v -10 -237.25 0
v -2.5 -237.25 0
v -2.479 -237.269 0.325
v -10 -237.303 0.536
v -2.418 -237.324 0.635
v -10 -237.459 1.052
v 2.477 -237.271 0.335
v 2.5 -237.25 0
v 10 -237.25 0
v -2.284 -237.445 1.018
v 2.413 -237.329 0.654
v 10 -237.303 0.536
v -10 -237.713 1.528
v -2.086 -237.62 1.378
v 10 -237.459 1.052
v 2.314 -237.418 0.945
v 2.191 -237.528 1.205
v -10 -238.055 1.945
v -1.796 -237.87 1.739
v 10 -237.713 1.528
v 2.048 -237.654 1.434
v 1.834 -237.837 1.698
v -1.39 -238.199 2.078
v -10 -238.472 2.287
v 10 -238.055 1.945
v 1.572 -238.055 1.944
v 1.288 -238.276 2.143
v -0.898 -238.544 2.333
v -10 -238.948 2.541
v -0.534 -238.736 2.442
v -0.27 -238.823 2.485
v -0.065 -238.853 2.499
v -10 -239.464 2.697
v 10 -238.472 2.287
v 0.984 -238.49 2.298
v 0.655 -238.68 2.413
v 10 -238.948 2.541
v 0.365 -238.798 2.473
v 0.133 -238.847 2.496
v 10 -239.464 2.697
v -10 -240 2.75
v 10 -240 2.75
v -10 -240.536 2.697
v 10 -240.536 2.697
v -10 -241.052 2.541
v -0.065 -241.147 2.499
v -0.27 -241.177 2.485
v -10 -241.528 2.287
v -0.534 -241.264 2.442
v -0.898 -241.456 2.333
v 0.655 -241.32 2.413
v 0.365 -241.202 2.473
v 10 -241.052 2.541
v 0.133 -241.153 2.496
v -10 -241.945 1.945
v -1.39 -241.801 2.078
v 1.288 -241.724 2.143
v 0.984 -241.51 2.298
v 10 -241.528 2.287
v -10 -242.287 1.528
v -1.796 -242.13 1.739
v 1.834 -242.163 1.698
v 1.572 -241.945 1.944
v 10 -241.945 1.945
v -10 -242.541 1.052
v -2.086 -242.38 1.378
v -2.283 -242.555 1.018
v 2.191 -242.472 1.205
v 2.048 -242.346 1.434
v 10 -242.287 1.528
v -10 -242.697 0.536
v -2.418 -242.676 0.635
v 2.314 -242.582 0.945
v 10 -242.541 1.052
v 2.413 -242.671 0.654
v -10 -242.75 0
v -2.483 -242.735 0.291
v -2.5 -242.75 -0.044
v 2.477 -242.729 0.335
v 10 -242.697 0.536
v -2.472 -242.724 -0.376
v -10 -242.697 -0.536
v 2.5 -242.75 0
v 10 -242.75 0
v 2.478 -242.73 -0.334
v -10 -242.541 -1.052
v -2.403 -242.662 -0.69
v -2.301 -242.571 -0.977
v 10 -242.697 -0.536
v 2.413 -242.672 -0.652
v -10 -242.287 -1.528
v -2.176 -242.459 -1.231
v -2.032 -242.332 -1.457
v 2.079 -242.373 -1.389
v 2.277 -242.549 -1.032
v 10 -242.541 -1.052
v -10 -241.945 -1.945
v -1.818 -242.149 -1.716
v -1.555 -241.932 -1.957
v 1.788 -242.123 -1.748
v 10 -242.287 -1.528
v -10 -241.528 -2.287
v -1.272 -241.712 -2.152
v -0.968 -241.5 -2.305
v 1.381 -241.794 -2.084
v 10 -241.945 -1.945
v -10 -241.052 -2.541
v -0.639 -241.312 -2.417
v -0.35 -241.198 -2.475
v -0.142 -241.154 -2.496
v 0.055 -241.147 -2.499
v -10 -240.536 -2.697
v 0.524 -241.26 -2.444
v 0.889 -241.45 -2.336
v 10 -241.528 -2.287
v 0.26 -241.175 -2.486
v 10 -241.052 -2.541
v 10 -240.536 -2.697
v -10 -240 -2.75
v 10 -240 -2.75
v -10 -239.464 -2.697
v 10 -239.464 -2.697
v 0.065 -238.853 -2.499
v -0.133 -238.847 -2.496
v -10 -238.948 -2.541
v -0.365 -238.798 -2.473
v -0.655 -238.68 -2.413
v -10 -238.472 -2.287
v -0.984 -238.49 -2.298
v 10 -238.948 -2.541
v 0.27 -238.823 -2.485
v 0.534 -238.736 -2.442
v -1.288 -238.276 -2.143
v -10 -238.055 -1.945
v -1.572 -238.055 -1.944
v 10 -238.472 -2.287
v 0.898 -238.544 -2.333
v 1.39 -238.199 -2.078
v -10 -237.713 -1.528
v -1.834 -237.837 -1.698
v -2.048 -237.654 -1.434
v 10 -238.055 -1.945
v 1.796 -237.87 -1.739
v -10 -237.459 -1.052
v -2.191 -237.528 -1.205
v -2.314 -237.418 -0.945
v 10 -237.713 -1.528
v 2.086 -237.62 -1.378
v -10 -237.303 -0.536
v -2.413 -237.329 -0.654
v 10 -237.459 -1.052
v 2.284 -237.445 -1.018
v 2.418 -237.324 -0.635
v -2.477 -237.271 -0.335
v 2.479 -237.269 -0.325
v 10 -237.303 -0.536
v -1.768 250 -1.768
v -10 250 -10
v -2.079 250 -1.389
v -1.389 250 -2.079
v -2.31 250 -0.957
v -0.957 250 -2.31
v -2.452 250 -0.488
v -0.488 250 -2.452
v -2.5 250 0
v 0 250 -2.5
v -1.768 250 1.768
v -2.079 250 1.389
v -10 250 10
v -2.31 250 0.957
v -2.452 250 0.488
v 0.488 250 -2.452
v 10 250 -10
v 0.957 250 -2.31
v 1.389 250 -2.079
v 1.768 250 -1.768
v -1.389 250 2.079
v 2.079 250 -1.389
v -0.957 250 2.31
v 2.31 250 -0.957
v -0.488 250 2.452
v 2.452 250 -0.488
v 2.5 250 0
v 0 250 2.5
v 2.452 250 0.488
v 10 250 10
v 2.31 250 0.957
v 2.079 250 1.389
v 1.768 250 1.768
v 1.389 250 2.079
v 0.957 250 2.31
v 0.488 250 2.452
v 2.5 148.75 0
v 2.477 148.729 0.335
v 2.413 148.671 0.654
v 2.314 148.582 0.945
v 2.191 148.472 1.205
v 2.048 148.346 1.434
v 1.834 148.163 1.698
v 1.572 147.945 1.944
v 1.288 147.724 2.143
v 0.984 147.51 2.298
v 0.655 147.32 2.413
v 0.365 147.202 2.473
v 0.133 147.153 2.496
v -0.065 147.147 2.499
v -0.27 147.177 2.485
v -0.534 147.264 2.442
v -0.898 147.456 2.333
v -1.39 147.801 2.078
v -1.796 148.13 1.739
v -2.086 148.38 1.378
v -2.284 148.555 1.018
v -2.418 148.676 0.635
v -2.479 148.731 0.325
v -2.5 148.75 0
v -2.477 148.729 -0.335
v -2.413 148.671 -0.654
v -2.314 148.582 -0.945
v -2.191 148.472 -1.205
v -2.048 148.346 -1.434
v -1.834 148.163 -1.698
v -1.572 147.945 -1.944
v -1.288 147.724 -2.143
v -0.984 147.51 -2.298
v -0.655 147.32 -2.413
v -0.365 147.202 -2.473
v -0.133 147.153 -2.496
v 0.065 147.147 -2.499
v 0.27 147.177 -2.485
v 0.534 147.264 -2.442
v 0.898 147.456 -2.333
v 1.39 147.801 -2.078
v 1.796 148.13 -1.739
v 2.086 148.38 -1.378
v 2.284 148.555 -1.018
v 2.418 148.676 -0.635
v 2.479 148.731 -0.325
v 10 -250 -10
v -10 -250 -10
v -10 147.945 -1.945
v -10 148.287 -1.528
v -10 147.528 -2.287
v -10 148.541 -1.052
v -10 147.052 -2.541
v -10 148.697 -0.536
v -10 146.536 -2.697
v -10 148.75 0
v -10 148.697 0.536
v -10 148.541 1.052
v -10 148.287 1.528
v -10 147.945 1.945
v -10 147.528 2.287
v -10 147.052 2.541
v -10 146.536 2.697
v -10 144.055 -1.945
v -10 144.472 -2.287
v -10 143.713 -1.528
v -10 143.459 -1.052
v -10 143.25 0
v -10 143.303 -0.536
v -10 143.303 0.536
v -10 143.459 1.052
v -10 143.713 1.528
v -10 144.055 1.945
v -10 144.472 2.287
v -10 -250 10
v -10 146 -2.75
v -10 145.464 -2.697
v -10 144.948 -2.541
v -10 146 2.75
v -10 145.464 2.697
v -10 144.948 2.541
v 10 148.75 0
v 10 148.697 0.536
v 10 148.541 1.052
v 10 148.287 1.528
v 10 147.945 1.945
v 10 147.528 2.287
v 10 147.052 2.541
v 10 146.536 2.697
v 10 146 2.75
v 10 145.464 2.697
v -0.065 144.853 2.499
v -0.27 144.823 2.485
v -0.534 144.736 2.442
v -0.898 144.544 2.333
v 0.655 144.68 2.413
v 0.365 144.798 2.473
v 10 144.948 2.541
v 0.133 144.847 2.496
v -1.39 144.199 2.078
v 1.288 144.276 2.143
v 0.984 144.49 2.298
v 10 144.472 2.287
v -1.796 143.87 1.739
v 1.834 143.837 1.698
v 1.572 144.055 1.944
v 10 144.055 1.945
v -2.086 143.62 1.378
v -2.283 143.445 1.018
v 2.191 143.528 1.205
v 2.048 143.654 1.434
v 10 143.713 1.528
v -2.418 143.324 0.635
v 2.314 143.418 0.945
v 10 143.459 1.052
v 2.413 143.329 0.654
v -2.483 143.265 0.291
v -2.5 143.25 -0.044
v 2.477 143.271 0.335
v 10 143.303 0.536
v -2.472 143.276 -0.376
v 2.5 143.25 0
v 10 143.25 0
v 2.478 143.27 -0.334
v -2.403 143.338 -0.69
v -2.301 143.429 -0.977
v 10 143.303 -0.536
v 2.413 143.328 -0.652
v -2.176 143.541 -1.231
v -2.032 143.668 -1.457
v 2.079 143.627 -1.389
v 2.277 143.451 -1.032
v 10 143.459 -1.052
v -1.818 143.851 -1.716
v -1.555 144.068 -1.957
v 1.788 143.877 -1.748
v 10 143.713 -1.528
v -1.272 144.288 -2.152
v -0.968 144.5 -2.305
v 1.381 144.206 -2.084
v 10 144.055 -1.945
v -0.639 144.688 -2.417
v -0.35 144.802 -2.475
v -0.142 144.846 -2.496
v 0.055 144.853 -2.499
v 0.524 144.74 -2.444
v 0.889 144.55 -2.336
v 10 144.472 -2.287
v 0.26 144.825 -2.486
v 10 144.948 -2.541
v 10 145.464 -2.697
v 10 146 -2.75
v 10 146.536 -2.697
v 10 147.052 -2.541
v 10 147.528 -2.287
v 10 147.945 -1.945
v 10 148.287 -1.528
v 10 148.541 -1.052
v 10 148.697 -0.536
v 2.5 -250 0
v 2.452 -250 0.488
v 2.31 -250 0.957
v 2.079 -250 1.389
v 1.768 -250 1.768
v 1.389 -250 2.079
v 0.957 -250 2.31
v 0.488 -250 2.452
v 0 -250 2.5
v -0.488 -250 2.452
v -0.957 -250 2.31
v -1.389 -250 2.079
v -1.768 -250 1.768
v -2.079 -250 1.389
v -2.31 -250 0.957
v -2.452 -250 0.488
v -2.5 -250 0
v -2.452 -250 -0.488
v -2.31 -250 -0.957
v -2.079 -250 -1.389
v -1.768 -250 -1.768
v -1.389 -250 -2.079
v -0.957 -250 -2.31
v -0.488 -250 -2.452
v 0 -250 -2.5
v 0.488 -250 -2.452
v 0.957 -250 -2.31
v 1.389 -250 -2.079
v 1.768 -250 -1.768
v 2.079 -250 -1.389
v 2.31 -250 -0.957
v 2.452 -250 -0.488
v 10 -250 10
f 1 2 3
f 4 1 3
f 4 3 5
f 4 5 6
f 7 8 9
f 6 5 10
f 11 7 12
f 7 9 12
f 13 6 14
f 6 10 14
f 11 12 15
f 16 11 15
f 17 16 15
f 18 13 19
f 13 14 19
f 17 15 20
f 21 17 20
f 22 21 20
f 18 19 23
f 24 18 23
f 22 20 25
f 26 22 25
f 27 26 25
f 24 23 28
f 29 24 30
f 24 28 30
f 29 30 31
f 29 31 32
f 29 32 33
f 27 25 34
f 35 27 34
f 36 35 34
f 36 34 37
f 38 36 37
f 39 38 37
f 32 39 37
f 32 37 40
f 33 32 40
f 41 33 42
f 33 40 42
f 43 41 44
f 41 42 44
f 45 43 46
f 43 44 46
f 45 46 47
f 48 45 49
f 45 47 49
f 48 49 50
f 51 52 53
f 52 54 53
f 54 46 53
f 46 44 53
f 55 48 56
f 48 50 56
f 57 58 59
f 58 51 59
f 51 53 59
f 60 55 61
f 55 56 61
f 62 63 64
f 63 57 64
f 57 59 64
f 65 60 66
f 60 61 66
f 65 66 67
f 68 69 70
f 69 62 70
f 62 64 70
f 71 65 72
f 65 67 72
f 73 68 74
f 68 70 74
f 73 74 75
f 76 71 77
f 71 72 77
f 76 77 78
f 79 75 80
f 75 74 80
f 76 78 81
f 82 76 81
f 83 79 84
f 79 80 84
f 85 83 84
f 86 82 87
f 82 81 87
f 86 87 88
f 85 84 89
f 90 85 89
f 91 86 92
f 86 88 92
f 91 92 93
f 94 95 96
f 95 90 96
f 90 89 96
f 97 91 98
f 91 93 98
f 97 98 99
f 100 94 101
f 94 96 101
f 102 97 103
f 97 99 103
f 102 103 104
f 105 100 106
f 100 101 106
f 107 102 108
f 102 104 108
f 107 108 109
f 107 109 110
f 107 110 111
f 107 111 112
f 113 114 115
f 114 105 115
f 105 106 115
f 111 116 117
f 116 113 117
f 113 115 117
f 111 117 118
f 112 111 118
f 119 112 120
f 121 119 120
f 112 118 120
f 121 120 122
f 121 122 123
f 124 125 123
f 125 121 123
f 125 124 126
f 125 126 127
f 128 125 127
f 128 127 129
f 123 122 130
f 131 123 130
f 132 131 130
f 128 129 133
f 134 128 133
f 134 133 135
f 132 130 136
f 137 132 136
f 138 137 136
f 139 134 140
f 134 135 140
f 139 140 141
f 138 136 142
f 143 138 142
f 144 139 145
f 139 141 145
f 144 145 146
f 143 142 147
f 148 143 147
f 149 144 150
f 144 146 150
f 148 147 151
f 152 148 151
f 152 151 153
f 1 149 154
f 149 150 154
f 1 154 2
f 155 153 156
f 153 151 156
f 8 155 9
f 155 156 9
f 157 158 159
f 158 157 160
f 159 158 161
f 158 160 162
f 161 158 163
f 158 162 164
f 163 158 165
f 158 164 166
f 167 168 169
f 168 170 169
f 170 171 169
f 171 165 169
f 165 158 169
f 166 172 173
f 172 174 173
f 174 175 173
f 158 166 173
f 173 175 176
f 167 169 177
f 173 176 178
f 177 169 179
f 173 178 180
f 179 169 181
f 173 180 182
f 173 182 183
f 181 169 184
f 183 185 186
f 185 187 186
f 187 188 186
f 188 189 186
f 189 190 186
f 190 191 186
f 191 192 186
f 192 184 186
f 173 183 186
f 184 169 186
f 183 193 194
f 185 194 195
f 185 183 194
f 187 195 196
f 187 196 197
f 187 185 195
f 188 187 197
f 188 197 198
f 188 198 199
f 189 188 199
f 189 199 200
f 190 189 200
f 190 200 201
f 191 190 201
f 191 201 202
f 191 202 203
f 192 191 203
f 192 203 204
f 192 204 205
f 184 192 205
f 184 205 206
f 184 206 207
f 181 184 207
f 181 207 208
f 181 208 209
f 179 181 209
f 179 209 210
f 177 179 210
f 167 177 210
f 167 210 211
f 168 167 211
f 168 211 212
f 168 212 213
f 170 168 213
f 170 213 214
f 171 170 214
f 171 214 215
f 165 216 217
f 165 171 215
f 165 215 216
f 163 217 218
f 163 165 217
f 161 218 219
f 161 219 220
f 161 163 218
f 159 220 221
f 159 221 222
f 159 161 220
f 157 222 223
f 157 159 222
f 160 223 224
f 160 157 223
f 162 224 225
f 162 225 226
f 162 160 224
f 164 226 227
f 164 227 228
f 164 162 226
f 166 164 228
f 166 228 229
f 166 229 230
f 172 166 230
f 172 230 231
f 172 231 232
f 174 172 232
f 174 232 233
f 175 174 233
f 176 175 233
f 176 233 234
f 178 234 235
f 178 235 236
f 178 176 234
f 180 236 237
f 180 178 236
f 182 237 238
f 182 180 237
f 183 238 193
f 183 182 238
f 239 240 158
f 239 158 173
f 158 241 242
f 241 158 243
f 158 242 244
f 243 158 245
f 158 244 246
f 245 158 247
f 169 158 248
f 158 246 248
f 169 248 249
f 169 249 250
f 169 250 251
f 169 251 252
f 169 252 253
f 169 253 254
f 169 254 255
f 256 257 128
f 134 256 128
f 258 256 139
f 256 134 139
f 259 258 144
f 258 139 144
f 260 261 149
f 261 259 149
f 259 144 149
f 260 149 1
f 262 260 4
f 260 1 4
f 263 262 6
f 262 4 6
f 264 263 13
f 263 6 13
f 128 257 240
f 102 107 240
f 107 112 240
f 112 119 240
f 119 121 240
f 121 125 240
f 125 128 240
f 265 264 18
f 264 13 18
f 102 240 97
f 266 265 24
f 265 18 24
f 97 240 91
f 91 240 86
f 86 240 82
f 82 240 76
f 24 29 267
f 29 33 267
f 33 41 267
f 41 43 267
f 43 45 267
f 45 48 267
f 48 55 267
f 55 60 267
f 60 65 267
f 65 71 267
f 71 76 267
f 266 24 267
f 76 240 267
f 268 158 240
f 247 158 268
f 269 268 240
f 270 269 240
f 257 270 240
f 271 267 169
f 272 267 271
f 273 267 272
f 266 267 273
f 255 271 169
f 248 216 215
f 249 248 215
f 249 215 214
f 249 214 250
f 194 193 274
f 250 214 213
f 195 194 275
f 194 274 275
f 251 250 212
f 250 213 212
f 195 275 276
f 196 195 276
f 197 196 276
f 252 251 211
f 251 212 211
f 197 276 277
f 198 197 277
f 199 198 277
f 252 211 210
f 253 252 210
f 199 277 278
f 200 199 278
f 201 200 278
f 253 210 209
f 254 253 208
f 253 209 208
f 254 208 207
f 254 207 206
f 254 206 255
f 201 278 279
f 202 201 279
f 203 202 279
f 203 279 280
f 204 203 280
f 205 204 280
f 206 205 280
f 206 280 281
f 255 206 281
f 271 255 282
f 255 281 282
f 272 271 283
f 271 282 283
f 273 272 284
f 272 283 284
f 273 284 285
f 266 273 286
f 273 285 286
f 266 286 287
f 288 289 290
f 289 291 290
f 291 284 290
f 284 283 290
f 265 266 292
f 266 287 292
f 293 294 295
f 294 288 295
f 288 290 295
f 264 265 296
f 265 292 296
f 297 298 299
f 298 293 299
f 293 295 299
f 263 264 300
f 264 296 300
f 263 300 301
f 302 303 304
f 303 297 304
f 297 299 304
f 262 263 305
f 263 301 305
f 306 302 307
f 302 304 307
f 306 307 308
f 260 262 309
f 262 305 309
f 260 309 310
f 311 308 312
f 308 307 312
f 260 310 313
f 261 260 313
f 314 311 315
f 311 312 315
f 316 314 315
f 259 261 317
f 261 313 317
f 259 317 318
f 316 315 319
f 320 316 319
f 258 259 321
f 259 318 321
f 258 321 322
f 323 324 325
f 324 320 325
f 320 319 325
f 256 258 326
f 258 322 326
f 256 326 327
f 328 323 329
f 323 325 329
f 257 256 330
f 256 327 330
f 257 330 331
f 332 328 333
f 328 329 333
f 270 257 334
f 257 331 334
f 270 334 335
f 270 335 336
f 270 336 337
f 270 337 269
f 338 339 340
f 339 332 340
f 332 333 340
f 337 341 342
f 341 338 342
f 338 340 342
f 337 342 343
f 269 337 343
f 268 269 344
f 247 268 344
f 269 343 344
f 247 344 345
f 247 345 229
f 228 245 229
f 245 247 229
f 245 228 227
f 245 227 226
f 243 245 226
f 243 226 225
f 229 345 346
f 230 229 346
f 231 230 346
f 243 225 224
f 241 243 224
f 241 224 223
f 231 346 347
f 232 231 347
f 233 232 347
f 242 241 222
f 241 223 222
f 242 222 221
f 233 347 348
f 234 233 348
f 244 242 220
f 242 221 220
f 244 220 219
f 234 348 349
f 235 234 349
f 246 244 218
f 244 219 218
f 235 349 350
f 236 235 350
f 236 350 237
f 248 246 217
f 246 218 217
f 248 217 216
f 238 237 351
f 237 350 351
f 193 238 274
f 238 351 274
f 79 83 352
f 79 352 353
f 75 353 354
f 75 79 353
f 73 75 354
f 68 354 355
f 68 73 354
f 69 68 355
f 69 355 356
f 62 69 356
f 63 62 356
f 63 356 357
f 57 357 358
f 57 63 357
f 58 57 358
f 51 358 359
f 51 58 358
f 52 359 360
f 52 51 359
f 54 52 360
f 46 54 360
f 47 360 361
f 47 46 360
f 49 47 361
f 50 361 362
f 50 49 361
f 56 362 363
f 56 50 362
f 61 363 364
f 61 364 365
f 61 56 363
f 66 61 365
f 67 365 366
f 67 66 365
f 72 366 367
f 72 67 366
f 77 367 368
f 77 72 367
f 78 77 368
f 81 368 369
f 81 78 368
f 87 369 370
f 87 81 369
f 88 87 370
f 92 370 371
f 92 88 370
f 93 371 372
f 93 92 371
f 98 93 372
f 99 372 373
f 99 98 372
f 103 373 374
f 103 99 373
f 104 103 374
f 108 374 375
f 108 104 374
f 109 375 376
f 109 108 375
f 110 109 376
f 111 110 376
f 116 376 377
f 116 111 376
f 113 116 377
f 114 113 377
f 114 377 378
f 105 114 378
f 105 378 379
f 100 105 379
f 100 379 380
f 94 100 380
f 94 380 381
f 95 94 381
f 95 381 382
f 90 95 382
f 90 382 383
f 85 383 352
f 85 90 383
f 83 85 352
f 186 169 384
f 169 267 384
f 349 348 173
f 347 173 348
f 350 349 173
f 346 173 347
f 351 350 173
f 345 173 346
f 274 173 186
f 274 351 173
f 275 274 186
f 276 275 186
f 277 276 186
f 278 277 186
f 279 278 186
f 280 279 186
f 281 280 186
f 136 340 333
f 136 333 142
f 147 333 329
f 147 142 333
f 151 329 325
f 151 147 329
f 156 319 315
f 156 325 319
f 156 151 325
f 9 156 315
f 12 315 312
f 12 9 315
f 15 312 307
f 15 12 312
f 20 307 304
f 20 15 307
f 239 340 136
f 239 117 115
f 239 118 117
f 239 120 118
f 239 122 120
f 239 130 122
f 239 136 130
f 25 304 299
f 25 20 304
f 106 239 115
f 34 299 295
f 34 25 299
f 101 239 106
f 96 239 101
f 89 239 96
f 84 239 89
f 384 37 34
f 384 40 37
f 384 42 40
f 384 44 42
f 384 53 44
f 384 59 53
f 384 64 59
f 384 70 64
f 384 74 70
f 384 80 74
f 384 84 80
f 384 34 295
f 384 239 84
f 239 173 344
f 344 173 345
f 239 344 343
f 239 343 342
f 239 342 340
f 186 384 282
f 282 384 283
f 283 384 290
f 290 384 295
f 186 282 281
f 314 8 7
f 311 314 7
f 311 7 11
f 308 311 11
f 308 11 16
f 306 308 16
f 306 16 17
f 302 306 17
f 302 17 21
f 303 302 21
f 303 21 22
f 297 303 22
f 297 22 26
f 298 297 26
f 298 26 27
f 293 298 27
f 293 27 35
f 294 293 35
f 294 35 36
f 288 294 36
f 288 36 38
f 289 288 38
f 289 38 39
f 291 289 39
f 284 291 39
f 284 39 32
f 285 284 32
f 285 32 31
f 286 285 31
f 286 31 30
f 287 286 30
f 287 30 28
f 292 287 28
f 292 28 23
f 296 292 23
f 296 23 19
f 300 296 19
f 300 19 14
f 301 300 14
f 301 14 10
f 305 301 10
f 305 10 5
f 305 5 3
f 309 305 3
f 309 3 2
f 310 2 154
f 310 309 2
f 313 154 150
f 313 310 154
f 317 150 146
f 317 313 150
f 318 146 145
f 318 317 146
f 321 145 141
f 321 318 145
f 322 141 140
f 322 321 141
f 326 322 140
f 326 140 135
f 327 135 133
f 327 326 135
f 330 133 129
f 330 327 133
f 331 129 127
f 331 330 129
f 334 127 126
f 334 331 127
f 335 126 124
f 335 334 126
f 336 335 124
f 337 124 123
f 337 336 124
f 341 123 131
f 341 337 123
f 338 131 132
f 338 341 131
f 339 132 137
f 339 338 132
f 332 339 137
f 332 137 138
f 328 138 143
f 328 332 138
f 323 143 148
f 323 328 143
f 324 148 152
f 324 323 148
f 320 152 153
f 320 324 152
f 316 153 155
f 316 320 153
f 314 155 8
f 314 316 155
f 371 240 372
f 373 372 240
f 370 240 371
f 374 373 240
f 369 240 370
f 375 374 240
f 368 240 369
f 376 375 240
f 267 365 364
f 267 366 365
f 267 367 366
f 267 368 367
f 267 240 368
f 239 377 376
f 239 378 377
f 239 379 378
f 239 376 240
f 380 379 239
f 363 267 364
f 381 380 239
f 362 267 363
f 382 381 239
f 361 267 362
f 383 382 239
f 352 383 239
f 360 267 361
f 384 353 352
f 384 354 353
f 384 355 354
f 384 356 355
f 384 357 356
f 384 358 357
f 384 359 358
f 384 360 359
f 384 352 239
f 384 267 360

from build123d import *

# Parameters (mm, degrees)
F0_W     = 20
F0_H     = 20
F0_R     = 2.5
F1_DEPTH = 250
F2_R     = 2.75
F3_DEPTH = 20


with BuildPart() as f1:
    # F0 (on Front) → F1 (new body, symmetric)
    with BuildSketch(Plane.XZ):
        Rectangle(F0_W, F0_H)
        Circle(F0_R, mode=Mode.SUBTRACT)
    extrude(amount=F1_DEPTH, both=True)

    # F2 (on face) → F3 (cut)
    with BuildSketch(Plane.YZ.offset(10)):
        with Locations((-240, 0)):
            Circle(F2_R)
        with Locations((146, 0)):
            Circle(F2_R)
    extrude(amount=-F3_DEPTH, mode=Mode.SUBTRACT)


solid = f1.part
